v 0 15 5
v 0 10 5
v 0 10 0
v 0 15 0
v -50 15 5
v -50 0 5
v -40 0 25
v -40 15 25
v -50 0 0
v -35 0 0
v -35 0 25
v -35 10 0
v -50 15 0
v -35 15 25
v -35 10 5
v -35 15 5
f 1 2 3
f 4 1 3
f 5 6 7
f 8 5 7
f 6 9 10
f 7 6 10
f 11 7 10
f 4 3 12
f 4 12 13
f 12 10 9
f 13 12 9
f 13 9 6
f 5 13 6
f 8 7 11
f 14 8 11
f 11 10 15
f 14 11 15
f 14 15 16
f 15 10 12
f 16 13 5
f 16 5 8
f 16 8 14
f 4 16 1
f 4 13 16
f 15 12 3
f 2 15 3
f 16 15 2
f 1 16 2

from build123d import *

# Parameters (mm, degrees)
BOSS_EXTRU_1_DEPTH           = 15
ENL_V_MAT_EXTRU_1_DEPTH      = 56.901699437
ENL_V_MAT_EXTRU_1_DEPTH_BACK = 56.901699437
ESQUISSE2_W                  = 35
ESQUISSE2_H                  = 10


with BuildPart() as part:
    # Esquisse1 → Boss.-Extru.1 (new body)
    with BuildSketch(Plane(origin=(0, 0, 0), x_dir=(1, 0, 0), z_dir=(0, 1, 0))):
        Polygon((0, 0), (-50, 0), (-50, -5), (-40, -25), (-35, -25), (-35, -5), (0, -5), align=None)
    extrude(amount=BOSS_EXTRU_1_DEPTH)

    # Esquisse2 → Enlèv. mat.-Extru.1 (cut, two sides: drawn at the far end of the back side and taken through both)
    with BuildSketch(Plane.XY.offset(5).offset(-ENL_V_MAT_EXTRU_1_DEPTH_BACK)):
        with Locations((-17.5, 5)):
            Rectangle(ESQUISSE2_W, ESQUISSE2_H)
    extrude(amount=ENL_V_MAT_EXTRU_1_DEPTH + ENL_V_MAT_EXTRU_1_DEPTH_BACK, mode=Mode.SUBTRACT)


solid = part.part
